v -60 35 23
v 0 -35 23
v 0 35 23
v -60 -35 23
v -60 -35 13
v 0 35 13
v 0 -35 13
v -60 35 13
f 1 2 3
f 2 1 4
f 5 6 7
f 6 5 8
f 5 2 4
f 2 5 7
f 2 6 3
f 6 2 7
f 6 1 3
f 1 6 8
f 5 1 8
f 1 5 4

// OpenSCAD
// Built by bench/smallmodels/features/compiler.py from a list of features.
$fn = 64;
difference() {
  union() {
    translate([0, 0, 0]) translate([-60, -35, 0]) cube([120, 70, 40]);
  }
  union() {
    translate([0, 0, 3]) rotate([0, 0, 0]) translate([-60, -35, 0]) cube([120, 70, 37]);
    translate([0, 0, 0]) rotate([0, 0, 0]) translate([-60, -35, 0]) cube([120, 70, 37]);
  }
}
union() {
    translate([-30, 0, 13]) translate([-30, -35, 0]) cube([60, 70, 10]);
  }
